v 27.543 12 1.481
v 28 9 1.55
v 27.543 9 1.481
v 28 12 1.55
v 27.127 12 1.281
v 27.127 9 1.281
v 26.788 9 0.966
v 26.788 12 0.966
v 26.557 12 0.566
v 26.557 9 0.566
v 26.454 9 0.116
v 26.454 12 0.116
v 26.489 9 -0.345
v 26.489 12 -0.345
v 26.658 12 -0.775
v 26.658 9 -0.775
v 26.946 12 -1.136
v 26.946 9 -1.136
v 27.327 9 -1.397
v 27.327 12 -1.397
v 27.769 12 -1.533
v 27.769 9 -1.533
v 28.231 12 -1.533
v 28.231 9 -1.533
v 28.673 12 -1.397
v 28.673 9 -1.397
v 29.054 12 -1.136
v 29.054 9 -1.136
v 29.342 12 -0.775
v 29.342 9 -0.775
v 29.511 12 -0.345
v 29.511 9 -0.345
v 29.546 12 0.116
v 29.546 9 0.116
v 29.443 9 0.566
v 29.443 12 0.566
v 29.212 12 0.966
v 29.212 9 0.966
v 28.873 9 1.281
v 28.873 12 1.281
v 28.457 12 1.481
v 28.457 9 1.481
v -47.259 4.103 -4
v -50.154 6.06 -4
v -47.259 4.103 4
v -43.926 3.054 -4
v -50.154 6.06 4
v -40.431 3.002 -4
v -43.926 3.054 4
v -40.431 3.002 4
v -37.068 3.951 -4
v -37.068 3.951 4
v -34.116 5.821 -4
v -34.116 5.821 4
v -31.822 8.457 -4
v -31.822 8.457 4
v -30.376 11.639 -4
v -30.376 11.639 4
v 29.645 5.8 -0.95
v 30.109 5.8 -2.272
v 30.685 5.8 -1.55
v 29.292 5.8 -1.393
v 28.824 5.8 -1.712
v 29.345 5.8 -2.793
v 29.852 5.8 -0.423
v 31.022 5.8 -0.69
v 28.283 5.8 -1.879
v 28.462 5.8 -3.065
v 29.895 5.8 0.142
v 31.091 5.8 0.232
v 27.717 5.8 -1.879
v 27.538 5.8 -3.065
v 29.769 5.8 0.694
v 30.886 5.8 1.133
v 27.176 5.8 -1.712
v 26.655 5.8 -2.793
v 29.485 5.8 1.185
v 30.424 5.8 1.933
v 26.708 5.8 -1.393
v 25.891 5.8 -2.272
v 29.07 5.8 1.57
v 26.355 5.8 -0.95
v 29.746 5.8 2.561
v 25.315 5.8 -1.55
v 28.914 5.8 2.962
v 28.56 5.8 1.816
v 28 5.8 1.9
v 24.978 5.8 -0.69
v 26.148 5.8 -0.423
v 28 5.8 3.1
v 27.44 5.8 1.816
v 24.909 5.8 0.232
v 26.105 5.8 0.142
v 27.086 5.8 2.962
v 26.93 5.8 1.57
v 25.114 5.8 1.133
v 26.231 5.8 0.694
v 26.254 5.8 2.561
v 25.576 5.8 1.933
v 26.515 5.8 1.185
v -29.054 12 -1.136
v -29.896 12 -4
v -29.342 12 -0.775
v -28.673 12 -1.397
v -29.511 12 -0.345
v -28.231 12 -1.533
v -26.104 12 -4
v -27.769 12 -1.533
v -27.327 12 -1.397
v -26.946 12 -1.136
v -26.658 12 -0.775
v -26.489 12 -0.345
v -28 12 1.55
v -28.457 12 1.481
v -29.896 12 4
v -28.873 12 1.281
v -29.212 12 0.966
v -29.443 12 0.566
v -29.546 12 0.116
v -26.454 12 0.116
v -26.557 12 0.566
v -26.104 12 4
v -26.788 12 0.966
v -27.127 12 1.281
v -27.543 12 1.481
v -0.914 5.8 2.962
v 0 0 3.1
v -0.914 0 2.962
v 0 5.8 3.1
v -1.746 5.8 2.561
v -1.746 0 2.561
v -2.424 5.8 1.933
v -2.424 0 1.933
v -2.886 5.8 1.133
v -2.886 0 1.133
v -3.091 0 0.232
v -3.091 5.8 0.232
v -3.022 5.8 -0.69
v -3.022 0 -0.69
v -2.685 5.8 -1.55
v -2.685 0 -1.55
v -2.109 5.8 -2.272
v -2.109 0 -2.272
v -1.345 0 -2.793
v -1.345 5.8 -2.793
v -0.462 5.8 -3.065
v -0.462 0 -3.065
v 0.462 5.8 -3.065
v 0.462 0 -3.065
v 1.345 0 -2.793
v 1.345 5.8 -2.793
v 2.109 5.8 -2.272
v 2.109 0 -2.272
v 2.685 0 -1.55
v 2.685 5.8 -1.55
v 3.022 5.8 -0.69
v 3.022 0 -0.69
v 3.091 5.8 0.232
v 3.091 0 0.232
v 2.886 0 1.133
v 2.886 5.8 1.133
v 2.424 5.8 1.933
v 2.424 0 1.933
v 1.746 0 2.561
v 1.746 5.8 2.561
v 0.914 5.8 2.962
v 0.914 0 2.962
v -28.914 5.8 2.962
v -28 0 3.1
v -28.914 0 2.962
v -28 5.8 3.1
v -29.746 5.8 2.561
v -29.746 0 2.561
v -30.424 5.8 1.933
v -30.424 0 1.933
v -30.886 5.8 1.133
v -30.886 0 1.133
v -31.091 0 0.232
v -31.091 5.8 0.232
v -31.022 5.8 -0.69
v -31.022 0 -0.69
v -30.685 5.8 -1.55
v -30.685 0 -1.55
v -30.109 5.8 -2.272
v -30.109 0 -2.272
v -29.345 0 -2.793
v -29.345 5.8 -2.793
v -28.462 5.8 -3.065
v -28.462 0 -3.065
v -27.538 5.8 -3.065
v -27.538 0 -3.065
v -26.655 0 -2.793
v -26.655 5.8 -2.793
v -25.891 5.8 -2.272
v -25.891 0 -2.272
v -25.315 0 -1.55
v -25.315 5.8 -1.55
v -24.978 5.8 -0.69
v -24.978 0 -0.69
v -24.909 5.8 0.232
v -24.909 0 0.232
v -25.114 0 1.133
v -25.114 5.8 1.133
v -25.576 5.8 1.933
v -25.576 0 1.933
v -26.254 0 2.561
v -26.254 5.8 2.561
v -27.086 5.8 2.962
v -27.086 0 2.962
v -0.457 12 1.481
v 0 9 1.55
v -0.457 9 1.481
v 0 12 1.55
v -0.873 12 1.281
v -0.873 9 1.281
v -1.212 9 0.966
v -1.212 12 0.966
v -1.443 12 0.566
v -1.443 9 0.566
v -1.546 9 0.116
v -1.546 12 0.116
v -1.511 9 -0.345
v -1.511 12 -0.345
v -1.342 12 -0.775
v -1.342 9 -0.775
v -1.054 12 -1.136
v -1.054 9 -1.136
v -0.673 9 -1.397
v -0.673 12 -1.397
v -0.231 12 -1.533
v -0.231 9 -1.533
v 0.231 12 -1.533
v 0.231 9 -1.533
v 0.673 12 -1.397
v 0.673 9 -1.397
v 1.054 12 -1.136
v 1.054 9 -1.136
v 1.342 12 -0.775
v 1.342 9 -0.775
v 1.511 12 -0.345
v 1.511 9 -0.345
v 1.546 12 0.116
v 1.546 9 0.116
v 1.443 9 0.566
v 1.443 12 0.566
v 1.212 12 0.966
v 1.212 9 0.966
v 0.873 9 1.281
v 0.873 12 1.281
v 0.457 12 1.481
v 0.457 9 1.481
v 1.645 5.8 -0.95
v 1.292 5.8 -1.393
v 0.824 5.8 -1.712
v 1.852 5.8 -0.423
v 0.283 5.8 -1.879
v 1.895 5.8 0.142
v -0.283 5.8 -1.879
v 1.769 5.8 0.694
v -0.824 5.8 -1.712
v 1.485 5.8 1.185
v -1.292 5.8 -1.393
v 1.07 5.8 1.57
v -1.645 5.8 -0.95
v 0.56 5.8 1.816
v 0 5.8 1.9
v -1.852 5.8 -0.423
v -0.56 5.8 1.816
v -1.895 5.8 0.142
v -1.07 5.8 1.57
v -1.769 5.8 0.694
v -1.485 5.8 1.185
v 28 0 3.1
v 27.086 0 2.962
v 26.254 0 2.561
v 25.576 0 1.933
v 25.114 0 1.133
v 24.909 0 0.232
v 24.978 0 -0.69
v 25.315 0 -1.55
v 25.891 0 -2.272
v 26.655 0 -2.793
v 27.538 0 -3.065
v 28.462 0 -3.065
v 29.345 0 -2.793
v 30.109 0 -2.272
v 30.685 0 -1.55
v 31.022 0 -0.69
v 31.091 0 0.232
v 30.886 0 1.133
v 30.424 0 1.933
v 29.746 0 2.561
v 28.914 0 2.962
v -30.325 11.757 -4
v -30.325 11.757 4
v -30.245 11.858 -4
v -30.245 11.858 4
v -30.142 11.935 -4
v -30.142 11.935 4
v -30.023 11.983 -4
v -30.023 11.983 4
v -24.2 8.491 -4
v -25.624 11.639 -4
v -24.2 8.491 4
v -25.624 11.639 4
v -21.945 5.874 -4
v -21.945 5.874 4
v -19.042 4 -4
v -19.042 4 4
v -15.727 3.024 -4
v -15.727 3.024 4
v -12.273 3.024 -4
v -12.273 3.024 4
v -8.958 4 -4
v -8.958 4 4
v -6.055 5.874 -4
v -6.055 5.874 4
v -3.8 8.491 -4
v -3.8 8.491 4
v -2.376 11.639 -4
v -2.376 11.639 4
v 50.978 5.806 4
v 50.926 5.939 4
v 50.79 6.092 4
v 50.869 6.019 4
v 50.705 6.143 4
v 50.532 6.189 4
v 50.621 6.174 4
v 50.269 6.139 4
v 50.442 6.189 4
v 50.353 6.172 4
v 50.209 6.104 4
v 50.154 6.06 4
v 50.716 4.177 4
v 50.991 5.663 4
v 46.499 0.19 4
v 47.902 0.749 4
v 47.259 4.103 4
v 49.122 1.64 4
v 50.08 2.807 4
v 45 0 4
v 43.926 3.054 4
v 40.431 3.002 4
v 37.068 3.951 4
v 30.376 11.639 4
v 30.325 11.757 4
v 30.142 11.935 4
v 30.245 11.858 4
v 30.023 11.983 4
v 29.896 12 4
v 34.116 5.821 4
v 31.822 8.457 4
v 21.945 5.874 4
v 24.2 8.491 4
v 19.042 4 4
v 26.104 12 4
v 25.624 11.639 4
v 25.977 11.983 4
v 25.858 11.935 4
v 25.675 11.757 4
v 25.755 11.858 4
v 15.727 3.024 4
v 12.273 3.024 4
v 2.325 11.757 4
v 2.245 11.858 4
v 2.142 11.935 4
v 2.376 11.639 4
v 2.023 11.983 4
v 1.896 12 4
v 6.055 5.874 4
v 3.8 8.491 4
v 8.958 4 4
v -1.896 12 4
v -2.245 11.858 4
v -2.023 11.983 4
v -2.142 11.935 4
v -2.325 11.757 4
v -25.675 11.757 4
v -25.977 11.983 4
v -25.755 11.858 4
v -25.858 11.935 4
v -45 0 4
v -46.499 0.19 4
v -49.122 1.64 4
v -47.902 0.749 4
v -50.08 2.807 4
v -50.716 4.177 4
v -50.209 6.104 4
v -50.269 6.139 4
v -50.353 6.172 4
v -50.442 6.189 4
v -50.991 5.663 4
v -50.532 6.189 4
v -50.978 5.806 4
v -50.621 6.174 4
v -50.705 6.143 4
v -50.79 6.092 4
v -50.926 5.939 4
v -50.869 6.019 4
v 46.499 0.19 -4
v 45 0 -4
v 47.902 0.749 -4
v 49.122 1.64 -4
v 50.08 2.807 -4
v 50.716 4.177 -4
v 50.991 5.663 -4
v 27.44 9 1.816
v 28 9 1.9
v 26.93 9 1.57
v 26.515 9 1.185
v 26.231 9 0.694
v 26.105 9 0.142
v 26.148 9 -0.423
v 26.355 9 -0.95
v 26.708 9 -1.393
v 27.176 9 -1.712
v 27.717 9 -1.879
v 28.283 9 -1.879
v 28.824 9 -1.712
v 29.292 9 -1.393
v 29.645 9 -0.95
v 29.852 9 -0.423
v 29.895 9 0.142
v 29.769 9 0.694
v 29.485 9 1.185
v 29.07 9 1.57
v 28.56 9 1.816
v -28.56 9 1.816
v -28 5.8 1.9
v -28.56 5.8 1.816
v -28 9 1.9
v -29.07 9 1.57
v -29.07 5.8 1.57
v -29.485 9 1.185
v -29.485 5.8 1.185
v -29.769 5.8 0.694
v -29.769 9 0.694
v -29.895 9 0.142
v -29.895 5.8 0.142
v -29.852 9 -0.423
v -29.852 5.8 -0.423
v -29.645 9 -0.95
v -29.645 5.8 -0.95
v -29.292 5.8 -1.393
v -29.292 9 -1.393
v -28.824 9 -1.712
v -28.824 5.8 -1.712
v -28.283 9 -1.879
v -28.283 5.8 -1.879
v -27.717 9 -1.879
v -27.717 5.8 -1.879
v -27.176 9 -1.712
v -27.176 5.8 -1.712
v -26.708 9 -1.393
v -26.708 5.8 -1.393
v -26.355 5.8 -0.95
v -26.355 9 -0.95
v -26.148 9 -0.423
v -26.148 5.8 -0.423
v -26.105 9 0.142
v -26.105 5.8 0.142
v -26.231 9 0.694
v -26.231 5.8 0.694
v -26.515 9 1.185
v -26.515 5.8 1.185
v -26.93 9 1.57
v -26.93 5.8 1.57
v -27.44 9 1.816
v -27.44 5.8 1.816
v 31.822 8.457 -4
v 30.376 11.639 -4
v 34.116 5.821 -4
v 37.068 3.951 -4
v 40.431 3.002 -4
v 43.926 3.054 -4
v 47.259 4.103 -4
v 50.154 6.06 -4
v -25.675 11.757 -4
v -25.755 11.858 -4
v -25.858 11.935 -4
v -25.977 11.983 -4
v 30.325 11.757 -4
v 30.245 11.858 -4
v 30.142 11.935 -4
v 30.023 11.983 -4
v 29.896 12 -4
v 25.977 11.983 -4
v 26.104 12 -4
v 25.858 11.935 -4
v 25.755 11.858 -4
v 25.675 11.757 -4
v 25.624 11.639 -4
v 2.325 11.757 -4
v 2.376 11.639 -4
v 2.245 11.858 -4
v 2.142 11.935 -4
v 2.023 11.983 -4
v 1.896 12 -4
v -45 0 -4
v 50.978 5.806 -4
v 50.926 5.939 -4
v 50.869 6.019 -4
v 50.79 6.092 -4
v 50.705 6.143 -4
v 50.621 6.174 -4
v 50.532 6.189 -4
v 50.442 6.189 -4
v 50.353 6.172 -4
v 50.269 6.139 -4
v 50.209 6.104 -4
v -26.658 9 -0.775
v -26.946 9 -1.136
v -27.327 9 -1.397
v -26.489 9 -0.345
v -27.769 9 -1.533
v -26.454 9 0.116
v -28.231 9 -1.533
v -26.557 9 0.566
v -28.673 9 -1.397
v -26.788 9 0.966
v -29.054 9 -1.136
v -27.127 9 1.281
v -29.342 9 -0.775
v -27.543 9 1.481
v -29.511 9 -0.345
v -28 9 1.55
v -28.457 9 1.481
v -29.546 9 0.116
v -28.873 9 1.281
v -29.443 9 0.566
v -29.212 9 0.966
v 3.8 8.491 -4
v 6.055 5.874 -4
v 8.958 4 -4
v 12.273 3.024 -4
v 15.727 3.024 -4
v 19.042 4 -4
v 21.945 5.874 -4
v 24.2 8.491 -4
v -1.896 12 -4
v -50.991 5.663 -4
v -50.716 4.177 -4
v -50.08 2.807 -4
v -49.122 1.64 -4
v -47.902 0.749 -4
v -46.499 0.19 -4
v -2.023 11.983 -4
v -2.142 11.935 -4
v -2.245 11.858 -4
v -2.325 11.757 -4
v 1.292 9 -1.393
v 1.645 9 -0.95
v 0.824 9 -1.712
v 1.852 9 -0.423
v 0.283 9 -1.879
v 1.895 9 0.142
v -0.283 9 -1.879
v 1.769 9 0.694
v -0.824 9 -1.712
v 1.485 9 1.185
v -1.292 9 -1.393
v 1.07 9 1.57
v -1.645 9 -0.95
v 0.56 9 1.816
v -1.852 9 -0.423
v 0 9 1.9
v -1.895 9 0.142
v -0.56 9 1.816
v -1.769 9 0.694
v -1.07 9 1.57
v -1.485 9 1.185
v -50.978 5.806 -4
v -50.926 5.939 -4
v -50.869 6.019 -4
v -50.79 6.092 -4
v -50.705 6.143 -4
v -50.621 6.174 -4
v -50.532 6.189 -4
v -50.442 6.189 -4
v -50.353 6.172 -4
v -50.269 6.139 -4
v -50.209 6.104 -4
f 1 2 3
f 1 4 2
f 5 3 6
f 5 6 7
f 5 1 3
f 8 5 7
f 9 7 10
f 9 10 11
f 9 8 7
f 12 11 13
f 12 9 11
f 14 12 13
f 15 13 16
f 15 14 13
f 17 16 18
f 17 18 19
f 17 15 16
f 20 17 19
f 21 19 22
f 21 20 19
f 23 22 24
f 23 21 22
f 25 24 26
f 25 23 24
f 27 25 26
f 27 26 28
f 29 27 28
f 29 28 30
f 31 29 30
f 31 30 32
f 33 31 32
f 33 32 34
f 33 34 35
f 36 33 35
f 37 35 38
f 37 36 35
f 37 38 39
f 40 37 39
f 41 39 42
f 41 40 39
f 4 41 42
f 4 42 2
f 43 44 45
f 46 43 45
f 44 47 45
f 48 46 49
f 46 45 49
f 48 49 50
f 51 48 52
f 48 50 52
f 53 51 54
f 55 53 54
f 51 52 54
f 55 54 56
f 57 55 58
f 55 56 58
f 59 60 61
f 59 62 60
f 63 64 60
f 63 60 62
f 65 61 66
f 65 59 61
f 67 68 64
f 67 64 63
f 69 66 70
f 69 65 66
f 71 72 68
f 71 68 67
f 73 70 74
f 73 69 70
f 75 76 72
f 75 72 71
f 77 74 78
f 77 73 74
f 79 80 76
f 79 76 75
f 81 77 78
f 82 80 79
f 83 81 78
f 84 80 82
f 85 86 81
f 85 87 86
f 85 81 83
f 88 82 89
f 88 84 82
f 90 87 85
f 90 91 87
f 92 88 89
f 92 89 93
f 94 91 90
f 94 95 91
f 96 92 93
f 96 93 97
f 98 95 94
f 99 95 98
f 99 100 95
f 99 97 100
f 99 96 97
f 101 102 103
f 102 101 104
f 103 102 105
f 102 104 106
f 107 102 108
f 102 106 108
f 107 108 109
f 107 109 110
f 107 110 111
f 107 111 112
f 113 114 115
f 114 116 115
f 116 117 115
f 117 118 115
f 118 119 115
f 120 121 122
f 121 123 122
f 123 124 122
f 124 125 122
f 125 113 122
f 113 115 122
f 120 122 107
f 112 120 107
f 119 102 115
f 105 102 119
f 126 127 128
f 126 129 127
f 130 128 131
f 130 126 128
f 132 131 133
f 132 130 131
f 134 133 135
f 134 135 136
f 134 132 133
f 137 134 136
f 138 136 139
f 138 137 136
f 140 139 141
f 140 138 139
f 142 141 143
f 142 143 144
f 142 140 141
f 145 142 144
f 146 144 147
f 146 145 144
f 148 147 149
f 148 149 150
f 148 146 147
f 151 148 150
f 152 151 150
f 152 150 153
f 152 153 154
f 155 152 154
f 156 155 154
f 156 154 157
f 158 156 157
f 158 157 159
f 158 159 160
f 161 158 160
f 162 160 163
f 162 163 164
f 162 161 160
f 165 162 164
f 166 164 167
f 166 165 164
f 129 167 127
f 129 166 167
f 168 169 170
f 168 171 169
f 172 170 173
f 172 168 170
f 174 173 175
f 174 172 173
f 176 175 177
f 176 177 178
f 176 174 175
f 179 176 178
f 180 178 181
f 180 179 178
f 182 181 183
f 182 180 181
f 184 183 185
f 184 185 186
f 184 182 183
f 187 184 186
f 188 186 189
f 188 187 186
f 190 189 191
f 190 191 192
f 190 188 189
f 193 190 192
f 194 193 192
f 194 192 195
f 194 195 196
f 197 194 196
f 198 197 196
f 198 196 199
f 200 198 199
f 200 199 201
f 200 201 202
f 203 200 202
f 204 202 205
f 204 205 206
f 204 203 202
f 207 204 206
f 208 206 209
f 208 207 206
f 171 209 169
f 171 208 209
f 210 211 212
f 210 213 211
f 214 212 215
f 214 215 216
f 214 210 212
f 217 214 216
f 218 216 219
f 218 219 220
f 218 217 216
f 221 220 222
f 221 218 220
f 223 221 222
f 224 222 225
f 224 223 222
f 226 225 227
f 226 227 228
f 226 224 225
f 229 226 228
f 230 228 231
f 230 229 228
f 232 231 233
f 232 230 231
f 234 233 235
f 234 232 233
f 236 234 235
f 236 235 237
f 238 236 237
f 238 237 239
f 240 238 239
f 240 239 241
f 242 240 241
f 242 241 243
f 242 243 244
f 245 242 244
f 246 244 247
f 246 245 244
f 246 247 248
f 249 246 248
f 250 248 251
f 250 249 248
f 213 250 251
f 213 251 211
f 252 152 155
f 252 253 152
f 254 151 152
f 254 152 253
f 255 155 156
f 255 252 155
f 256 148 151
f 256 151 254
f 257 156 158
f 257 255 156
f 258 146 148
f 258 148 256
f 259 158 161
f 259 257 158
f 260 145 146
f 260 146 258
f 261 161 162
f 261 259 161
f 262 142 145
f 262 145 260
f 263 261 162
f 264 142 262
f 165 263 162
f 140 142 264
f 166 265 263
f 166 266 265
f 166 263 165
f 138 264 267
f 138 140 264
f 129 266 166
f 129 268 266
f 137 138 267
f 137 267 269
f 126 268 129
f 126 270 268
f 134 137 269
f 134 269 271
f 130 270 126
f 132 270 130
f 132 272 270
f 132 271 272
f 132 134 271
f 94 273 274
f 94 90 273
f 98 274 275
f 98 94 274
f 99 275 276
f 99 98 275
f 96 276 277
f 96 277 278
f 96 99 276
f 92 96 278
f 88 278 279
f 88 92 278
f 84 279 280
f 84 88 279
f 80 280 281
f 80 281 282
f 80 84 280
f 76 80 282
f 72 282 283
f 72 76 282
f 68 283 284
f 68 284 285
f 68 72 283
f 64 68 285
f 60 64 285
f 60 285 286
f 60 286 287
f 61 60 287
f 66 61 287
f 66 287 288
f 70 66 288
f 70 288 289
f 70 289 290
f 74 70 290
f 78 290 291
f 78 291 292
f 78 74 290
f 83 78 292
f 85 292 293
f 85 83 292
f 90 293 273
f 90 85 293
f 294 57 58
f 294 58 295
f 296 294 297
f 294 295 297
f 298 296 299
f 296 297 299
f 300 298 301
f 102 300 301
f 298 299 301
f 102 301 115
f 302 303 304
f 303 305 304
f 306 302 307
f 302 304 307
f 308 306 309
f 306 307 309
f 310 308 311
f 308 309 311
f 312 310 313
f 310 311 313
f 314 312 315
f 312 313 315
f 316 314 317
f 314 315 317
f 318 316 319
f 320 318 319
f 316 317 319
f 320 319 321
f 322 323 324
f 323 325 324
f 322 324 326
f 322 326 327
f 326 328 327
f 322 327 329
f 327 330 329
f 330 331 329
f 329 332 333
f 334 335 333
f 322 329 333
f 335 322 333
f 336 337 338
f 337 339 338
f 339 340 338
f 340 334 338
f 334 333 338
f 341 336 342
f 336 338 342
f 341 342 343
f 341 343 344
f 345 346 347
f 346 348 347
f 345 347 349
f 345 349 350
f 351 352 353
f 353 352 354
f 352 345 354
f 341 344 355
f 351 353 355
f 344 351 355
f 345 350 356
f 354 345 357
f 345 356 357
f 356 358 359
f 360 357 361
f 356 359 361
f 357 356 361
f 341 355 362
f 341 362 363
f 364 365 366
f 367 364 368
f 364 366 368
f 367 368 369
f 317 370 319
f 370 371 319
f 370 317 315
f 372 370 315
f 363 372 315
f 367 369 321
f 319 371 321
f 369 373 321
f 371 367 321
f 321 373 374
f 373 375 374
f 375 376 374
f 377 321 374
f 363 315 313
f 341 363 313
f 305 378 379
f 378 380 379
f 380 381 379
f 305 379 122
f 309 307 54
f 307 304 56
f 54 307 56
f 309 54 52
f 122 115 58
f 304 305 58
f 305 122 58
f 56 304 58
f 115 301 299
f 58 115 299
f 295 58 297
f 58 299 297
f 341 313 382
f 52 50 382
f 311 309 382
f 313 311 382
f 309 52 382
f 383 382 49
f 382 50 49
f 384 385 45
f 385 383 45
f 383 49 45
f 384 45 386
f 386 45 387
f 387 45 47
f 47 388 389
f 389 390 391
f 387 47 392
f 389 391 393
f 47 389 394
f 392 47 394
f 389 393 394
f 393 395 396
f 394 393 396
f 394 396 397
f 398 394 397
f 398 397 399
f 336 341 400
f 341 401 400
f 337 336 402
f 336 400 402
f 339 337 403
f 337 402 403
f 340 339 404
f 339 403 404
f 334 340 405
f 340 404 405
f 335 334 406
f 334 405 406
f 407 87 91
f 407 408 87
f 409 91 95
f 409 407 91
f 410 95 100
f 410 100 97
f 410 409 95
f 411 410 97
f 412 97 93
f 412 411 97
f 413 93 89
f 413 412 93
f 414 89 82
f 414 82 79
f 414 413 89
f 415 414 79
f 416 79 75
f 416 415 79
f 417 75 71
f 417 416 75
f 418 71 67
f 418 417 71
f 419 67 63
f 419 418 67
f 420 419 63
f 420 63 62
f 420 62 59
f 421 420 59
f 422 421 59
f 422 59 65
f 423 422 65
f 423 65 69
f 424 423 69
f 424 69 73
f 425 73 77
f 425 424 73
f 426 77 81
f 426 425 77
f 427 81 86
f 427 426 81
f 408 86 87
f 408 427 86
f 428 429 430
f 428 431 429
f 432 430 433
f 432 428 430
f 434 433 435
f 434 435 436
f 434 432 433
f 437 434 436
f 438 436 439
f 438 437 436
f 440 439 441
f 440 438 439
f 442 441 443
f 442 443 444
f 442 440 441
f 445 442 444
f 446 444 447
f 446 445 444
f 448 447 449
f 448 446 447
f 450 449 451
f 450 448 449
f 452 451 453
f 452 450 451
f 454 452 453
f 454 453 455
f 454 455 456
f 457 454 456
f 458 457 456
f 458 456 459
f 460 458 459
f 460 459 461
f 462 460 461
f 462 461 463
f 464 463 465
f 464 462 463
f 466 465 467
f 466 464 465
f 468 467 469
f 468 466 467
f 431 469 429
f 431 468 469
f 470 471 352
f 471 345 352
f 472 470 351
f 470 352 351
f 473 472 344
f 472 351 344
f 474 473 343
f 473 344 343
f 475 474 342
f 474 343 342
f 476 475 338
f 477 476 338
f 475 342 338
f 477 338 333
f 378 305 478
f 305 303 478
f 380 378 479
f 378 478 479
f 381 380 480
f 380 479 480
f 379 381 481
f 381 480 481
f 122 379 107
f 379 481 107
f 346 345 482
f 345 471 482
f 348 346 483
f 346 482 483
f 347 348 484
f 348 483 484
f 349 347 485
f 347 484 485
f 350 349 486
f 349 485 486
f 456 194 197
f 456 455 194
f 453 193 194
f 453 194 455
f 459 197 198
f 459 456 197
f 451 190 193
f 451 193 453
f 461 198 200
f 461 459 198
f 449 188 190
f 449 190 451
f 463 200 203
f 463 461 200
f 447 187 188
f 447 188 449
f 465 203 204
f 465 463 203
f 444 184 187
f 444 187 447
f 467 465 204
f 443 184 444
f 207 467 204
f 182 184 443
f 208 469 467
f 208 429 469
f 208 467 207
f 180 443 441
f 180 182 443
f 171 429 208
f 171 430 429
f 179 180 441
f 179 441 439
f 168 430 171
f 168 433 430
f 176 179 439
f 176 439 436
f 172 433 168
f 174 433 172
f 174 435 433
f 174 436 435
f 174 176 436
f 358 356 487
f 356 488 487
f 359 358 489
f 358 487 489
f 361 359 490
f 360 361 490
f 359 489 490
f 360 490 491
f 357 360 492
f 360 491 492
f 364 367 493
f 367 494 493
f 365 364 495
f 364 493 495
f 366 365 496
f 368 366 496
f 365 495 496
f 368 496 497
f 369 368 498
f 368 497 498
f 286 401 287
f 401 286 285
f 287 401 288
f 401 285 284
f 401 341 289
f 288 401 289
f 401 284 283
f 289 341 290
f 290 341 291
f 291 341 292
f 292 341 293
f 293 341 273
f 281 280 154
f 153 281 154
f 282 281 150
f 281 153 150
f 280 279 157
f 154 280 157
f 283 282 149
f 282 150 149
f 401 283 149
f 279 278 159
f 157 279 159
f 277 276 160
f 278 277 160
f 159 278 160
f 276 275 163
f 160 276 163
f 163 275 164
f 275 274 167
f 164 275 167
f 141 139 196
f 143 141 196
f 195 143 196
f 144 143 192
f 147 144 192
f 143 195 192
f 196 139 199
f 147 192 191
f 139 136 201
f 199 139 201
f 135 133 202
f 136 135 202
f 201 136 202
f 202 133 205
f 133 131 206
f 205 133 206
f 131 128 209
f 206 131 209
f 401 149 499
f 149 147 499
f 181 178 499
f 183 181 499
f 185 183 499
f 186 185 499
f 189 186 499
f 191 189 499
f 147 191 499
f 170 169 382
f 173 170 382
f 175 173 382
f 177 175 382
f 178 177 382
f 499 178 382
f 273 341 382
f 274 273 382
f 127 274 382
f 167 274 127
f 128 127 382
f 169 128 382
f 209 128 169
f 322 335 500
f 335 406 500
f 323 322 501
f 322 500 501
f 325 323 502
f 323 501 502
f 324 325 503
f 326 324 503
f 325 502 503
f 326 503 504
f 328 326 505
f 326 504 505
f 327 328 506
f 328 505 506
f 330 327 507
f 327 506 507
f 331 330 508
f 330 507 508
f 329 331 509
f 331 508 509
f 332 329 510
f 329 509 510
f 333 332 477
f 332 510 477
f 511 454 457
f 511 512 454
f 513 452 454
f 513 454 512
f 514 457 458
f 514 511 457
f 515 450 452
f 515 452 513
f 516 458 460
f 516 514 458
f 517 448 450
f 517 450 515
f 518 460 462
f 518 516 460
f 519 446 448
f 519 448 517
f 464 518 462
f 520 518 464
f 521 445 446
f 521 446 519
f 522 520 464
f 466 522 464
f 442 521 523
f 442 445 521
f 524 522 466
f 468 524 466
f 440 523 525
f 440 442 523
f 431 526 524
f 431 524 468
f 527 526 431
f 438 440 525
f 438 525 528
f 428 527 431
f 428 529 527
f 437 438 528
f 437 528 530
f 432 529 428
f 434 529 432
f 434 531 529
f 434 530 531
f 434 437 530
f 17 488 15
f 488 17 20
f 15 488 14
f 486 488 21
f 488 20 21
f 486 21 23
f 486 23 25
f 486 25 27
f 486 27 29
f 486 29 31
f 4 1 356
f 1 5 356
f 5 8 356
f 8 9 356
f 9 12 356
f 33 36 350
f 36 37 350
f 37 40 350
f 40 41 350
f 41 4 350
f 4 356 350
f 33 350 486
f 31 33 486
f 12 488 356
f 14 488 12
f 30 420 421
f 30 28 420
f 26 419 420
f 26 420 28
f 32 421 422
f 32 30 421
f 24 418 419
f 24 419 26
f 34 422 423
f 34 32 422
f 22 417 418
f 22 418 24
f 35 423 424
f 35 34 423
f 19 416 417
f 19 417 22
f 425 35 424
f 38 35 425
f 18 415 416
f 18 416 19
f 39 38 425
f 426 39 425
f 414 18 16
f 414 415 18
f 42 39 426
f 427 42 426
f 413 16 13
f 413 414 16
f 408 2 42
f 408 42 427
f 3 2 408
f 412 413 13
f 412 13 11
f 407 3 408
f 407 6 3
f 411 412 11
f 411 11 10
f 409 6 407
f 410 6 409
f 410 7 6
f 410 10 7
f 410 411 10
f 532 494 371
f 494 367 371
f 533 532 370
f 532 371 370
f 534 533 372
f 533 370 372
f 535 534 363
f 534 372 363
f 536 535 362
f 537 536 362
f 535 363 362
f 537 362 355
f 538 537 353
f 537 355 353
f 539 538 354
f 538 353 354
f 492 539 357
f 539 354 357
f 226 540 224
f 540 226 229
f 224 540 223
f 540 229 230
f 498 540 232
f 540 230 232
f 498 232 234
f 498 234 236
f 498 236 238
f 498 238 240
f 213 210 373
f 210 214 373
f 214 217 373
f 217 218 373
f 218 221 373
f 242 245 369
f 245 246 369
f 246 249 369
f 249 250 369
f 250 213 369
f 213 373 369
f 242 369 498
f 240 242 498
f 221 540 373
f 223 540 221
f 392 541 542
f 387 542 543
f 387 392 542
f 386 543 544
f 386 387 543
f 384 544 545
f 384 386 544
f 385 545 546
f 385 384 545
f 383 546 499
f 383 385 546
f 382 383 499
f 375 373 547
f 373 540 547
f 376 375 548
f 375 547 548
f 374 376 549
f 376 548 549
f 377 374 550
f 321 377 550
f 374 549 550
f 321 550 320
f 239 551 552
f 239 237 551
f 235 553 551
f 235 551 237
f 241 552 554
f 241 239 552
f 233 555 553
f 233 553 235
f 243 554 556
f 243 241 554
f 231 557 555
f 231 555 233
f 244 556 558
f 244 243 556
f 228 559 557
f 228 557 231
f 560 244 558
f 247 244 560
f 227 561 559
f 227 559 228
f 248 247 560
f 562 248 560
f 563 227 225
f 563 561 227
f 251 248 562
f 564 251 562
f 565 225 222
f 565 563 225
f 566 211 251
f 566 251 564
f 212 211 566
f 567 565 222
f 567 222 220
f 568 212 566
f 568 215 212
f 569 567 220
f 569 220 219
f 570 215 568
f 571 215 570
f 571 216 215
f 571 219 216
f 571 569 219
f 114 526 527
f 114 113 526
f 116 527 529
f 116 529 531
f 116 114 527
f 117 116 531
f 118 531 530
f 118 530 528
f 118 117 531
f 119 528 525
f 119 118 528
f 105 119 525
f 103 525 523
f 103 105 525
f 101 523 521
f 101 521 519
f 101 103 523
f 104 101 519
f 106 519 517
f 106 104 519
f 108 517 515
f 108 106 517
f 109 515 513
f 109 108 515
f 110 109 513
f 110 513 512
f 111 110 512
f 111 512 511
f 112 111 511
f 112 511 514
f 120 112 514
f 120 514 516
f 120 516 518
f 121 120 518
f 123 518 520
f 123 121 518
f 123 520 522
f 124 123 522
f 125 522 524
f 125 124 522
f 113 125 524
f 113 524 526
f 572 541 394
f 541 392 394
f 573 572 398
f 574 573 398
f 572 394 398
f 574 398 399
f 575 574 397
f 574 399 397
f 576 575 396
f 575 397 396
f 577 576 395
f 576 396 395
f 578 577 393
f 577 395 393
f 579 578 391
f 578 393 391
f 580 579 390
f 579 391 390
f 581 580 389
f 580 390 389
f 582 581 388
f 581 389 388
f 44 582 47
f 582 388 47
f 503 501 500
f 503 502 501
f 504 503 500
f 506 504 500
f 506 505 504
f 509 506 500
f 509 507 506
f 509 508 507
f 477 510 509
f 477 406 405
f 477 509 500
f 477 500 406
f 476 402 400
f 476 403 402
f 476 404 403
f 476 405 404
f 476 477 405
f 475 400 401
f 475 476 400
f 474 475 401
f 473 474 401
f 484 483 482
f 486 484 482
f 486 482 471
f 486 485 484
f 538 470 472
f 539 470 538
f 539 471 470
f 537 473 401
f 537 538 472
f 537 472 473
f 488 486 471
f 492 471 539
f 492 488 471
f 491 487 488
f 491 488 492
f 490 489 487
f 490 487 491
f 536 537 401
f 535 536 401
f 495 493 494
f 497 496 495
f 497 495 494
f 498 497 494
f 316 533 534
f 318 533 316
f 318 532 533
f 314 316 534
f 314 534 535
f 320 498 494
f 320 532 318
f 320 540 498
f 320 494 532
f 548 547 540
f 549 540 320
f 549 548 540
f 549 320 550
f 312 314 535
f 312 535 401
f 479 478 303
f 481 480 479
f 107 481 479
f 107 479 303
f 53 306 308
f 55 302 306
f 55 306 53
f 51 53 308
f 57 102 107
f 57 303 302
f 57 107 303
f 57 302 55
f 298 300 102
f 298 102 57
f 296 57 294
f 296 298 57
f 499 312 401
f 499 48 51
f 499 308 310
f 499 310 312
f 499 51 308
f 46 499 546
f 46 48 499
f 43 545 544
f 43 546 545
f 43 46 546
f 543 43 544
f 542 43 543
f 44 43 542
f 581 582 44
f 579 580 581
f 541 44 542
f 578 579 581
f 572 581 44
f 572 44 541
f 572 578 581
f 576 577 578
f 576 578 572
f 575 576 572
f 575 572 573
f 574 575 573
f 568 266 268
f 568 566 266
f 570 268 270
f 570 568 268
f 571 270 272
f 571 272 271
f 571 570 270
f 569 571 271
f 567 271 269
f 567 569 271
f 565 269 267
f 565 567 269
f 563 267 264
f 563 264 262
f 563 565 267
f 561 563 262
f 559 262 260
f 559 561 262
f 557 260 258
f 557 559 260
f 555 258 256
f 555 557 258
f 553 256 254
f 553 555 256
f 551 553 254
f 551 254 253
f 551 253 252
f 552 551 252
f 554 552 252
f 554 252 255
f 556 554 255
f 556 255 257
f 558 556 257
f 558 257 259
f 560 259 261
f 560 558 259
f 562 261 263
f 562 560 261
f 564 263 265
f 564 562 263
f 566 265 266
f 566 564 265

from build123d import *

# Parameters (mm, degrees)
BOSS_EXTRU_1_DEPTH         = 4
CONG_1_R                   = 6
CONG_2_R                   = 0.5
R_P_TITION_LIN_AIRE1_COUNT = 3
R_P_TITION_LIN_AIRE1_PITCH = 28


with BuildPart() as part:
    # Esquisse1 → Boss.-Extru.1 (new, symmetric)
    with BuildSketch(Plane.XY):
        with BuildLine():
            Line((-30.277798842, 12), (-25.722201158, 12))
            ThreePointArc((-25.722201158, 12), (-14, 2.9), (-2.277798842, 12))
            Line((-2.277798842, 12), (2.277798842, 12))
            ThreePointArc((2.277798842, 12), (14, 2.9), (25.722201158, 12))
            Line((25.722201158, 12), (30.277798842, 12))
            ThreePointArc((30.277798842, 12), (39.114930254, 3.24898419), (51, 6.912355102))
            Line((51, 6.912355102), (51, 0))
            Line((51, 0), (-51, 0))
            Line((-51, 0), (-51, 6.912355102))
            ThreePointArc((-51, 6.912355102), (-39.114930254, 3.24898419), (-30.277798842, 12))
        make_face()
    extrude(amount=BOSS_EXTRU_1_DEPTH, both=True)

    # Congé1
    cong_1_edges = [part.edges().sort_by_distance(p)[0] for p in [
        (51, 0, 0),
        (-51, 0, 0),
    ]]
    fillet(cong_1_edges, radius=CONG_1_R)

    # Congé2
    cong_2_edges = [part.edges().sort_by_distance(p)[0] for p in [
        (51, 6.912355102, 0),
        (30.277798842, 12, 0),
        (25.722201158, 12, 0),
        (2.277798842, 12, 0),
        (-2.277798842, 12, 0),
        (-25.722201158, 12, 0),
        (-30.277798842, 12, 0),
        (-51, 6.912355102, 0),
    ]]
    fillet(cong_2_edges, radius=CONG_2_R)

    # Esquisse2 → Enlèvement de matière-Révolution1 (revolve, cut)
    with BuildSketch(Plane.XY, mode=Mode.PRIVATE) as enl_vement_de_mati_re_r_volution1_sk:
        Polygon((-28, 12), (-28, 0), (-24.9, 0), (-24.9, 5.8), (-26.1, 5.8), (-26.1, 9), (-26.45, 9), (-26.45, 12), align=None)
    enl_vement_de_mati_re_r_volution1 = revolve(enl_vement_de_mati_re_r_volution1_sk.sketch.rotate(Axis((-28, 0, 0), (0, -1, 0)), 90), axis=Axis((-28, 0, 0), (0, -1, 0)), mode=Mode.SUBTRACT)

    # Répétition linéaire1: Enlèvement de matière-Révolution1 ×3
    with Locations(*[(i * R_P_TITION_LIN_AIRE1_PITCH, 0, 0) for i in range(1, R_P_TITION_LIN_AIRE1_COUNT)]):
        add(enl_vement_de_mati_re_r_volution1, mode=Mode.SUBTRACT)


solid = part.part
